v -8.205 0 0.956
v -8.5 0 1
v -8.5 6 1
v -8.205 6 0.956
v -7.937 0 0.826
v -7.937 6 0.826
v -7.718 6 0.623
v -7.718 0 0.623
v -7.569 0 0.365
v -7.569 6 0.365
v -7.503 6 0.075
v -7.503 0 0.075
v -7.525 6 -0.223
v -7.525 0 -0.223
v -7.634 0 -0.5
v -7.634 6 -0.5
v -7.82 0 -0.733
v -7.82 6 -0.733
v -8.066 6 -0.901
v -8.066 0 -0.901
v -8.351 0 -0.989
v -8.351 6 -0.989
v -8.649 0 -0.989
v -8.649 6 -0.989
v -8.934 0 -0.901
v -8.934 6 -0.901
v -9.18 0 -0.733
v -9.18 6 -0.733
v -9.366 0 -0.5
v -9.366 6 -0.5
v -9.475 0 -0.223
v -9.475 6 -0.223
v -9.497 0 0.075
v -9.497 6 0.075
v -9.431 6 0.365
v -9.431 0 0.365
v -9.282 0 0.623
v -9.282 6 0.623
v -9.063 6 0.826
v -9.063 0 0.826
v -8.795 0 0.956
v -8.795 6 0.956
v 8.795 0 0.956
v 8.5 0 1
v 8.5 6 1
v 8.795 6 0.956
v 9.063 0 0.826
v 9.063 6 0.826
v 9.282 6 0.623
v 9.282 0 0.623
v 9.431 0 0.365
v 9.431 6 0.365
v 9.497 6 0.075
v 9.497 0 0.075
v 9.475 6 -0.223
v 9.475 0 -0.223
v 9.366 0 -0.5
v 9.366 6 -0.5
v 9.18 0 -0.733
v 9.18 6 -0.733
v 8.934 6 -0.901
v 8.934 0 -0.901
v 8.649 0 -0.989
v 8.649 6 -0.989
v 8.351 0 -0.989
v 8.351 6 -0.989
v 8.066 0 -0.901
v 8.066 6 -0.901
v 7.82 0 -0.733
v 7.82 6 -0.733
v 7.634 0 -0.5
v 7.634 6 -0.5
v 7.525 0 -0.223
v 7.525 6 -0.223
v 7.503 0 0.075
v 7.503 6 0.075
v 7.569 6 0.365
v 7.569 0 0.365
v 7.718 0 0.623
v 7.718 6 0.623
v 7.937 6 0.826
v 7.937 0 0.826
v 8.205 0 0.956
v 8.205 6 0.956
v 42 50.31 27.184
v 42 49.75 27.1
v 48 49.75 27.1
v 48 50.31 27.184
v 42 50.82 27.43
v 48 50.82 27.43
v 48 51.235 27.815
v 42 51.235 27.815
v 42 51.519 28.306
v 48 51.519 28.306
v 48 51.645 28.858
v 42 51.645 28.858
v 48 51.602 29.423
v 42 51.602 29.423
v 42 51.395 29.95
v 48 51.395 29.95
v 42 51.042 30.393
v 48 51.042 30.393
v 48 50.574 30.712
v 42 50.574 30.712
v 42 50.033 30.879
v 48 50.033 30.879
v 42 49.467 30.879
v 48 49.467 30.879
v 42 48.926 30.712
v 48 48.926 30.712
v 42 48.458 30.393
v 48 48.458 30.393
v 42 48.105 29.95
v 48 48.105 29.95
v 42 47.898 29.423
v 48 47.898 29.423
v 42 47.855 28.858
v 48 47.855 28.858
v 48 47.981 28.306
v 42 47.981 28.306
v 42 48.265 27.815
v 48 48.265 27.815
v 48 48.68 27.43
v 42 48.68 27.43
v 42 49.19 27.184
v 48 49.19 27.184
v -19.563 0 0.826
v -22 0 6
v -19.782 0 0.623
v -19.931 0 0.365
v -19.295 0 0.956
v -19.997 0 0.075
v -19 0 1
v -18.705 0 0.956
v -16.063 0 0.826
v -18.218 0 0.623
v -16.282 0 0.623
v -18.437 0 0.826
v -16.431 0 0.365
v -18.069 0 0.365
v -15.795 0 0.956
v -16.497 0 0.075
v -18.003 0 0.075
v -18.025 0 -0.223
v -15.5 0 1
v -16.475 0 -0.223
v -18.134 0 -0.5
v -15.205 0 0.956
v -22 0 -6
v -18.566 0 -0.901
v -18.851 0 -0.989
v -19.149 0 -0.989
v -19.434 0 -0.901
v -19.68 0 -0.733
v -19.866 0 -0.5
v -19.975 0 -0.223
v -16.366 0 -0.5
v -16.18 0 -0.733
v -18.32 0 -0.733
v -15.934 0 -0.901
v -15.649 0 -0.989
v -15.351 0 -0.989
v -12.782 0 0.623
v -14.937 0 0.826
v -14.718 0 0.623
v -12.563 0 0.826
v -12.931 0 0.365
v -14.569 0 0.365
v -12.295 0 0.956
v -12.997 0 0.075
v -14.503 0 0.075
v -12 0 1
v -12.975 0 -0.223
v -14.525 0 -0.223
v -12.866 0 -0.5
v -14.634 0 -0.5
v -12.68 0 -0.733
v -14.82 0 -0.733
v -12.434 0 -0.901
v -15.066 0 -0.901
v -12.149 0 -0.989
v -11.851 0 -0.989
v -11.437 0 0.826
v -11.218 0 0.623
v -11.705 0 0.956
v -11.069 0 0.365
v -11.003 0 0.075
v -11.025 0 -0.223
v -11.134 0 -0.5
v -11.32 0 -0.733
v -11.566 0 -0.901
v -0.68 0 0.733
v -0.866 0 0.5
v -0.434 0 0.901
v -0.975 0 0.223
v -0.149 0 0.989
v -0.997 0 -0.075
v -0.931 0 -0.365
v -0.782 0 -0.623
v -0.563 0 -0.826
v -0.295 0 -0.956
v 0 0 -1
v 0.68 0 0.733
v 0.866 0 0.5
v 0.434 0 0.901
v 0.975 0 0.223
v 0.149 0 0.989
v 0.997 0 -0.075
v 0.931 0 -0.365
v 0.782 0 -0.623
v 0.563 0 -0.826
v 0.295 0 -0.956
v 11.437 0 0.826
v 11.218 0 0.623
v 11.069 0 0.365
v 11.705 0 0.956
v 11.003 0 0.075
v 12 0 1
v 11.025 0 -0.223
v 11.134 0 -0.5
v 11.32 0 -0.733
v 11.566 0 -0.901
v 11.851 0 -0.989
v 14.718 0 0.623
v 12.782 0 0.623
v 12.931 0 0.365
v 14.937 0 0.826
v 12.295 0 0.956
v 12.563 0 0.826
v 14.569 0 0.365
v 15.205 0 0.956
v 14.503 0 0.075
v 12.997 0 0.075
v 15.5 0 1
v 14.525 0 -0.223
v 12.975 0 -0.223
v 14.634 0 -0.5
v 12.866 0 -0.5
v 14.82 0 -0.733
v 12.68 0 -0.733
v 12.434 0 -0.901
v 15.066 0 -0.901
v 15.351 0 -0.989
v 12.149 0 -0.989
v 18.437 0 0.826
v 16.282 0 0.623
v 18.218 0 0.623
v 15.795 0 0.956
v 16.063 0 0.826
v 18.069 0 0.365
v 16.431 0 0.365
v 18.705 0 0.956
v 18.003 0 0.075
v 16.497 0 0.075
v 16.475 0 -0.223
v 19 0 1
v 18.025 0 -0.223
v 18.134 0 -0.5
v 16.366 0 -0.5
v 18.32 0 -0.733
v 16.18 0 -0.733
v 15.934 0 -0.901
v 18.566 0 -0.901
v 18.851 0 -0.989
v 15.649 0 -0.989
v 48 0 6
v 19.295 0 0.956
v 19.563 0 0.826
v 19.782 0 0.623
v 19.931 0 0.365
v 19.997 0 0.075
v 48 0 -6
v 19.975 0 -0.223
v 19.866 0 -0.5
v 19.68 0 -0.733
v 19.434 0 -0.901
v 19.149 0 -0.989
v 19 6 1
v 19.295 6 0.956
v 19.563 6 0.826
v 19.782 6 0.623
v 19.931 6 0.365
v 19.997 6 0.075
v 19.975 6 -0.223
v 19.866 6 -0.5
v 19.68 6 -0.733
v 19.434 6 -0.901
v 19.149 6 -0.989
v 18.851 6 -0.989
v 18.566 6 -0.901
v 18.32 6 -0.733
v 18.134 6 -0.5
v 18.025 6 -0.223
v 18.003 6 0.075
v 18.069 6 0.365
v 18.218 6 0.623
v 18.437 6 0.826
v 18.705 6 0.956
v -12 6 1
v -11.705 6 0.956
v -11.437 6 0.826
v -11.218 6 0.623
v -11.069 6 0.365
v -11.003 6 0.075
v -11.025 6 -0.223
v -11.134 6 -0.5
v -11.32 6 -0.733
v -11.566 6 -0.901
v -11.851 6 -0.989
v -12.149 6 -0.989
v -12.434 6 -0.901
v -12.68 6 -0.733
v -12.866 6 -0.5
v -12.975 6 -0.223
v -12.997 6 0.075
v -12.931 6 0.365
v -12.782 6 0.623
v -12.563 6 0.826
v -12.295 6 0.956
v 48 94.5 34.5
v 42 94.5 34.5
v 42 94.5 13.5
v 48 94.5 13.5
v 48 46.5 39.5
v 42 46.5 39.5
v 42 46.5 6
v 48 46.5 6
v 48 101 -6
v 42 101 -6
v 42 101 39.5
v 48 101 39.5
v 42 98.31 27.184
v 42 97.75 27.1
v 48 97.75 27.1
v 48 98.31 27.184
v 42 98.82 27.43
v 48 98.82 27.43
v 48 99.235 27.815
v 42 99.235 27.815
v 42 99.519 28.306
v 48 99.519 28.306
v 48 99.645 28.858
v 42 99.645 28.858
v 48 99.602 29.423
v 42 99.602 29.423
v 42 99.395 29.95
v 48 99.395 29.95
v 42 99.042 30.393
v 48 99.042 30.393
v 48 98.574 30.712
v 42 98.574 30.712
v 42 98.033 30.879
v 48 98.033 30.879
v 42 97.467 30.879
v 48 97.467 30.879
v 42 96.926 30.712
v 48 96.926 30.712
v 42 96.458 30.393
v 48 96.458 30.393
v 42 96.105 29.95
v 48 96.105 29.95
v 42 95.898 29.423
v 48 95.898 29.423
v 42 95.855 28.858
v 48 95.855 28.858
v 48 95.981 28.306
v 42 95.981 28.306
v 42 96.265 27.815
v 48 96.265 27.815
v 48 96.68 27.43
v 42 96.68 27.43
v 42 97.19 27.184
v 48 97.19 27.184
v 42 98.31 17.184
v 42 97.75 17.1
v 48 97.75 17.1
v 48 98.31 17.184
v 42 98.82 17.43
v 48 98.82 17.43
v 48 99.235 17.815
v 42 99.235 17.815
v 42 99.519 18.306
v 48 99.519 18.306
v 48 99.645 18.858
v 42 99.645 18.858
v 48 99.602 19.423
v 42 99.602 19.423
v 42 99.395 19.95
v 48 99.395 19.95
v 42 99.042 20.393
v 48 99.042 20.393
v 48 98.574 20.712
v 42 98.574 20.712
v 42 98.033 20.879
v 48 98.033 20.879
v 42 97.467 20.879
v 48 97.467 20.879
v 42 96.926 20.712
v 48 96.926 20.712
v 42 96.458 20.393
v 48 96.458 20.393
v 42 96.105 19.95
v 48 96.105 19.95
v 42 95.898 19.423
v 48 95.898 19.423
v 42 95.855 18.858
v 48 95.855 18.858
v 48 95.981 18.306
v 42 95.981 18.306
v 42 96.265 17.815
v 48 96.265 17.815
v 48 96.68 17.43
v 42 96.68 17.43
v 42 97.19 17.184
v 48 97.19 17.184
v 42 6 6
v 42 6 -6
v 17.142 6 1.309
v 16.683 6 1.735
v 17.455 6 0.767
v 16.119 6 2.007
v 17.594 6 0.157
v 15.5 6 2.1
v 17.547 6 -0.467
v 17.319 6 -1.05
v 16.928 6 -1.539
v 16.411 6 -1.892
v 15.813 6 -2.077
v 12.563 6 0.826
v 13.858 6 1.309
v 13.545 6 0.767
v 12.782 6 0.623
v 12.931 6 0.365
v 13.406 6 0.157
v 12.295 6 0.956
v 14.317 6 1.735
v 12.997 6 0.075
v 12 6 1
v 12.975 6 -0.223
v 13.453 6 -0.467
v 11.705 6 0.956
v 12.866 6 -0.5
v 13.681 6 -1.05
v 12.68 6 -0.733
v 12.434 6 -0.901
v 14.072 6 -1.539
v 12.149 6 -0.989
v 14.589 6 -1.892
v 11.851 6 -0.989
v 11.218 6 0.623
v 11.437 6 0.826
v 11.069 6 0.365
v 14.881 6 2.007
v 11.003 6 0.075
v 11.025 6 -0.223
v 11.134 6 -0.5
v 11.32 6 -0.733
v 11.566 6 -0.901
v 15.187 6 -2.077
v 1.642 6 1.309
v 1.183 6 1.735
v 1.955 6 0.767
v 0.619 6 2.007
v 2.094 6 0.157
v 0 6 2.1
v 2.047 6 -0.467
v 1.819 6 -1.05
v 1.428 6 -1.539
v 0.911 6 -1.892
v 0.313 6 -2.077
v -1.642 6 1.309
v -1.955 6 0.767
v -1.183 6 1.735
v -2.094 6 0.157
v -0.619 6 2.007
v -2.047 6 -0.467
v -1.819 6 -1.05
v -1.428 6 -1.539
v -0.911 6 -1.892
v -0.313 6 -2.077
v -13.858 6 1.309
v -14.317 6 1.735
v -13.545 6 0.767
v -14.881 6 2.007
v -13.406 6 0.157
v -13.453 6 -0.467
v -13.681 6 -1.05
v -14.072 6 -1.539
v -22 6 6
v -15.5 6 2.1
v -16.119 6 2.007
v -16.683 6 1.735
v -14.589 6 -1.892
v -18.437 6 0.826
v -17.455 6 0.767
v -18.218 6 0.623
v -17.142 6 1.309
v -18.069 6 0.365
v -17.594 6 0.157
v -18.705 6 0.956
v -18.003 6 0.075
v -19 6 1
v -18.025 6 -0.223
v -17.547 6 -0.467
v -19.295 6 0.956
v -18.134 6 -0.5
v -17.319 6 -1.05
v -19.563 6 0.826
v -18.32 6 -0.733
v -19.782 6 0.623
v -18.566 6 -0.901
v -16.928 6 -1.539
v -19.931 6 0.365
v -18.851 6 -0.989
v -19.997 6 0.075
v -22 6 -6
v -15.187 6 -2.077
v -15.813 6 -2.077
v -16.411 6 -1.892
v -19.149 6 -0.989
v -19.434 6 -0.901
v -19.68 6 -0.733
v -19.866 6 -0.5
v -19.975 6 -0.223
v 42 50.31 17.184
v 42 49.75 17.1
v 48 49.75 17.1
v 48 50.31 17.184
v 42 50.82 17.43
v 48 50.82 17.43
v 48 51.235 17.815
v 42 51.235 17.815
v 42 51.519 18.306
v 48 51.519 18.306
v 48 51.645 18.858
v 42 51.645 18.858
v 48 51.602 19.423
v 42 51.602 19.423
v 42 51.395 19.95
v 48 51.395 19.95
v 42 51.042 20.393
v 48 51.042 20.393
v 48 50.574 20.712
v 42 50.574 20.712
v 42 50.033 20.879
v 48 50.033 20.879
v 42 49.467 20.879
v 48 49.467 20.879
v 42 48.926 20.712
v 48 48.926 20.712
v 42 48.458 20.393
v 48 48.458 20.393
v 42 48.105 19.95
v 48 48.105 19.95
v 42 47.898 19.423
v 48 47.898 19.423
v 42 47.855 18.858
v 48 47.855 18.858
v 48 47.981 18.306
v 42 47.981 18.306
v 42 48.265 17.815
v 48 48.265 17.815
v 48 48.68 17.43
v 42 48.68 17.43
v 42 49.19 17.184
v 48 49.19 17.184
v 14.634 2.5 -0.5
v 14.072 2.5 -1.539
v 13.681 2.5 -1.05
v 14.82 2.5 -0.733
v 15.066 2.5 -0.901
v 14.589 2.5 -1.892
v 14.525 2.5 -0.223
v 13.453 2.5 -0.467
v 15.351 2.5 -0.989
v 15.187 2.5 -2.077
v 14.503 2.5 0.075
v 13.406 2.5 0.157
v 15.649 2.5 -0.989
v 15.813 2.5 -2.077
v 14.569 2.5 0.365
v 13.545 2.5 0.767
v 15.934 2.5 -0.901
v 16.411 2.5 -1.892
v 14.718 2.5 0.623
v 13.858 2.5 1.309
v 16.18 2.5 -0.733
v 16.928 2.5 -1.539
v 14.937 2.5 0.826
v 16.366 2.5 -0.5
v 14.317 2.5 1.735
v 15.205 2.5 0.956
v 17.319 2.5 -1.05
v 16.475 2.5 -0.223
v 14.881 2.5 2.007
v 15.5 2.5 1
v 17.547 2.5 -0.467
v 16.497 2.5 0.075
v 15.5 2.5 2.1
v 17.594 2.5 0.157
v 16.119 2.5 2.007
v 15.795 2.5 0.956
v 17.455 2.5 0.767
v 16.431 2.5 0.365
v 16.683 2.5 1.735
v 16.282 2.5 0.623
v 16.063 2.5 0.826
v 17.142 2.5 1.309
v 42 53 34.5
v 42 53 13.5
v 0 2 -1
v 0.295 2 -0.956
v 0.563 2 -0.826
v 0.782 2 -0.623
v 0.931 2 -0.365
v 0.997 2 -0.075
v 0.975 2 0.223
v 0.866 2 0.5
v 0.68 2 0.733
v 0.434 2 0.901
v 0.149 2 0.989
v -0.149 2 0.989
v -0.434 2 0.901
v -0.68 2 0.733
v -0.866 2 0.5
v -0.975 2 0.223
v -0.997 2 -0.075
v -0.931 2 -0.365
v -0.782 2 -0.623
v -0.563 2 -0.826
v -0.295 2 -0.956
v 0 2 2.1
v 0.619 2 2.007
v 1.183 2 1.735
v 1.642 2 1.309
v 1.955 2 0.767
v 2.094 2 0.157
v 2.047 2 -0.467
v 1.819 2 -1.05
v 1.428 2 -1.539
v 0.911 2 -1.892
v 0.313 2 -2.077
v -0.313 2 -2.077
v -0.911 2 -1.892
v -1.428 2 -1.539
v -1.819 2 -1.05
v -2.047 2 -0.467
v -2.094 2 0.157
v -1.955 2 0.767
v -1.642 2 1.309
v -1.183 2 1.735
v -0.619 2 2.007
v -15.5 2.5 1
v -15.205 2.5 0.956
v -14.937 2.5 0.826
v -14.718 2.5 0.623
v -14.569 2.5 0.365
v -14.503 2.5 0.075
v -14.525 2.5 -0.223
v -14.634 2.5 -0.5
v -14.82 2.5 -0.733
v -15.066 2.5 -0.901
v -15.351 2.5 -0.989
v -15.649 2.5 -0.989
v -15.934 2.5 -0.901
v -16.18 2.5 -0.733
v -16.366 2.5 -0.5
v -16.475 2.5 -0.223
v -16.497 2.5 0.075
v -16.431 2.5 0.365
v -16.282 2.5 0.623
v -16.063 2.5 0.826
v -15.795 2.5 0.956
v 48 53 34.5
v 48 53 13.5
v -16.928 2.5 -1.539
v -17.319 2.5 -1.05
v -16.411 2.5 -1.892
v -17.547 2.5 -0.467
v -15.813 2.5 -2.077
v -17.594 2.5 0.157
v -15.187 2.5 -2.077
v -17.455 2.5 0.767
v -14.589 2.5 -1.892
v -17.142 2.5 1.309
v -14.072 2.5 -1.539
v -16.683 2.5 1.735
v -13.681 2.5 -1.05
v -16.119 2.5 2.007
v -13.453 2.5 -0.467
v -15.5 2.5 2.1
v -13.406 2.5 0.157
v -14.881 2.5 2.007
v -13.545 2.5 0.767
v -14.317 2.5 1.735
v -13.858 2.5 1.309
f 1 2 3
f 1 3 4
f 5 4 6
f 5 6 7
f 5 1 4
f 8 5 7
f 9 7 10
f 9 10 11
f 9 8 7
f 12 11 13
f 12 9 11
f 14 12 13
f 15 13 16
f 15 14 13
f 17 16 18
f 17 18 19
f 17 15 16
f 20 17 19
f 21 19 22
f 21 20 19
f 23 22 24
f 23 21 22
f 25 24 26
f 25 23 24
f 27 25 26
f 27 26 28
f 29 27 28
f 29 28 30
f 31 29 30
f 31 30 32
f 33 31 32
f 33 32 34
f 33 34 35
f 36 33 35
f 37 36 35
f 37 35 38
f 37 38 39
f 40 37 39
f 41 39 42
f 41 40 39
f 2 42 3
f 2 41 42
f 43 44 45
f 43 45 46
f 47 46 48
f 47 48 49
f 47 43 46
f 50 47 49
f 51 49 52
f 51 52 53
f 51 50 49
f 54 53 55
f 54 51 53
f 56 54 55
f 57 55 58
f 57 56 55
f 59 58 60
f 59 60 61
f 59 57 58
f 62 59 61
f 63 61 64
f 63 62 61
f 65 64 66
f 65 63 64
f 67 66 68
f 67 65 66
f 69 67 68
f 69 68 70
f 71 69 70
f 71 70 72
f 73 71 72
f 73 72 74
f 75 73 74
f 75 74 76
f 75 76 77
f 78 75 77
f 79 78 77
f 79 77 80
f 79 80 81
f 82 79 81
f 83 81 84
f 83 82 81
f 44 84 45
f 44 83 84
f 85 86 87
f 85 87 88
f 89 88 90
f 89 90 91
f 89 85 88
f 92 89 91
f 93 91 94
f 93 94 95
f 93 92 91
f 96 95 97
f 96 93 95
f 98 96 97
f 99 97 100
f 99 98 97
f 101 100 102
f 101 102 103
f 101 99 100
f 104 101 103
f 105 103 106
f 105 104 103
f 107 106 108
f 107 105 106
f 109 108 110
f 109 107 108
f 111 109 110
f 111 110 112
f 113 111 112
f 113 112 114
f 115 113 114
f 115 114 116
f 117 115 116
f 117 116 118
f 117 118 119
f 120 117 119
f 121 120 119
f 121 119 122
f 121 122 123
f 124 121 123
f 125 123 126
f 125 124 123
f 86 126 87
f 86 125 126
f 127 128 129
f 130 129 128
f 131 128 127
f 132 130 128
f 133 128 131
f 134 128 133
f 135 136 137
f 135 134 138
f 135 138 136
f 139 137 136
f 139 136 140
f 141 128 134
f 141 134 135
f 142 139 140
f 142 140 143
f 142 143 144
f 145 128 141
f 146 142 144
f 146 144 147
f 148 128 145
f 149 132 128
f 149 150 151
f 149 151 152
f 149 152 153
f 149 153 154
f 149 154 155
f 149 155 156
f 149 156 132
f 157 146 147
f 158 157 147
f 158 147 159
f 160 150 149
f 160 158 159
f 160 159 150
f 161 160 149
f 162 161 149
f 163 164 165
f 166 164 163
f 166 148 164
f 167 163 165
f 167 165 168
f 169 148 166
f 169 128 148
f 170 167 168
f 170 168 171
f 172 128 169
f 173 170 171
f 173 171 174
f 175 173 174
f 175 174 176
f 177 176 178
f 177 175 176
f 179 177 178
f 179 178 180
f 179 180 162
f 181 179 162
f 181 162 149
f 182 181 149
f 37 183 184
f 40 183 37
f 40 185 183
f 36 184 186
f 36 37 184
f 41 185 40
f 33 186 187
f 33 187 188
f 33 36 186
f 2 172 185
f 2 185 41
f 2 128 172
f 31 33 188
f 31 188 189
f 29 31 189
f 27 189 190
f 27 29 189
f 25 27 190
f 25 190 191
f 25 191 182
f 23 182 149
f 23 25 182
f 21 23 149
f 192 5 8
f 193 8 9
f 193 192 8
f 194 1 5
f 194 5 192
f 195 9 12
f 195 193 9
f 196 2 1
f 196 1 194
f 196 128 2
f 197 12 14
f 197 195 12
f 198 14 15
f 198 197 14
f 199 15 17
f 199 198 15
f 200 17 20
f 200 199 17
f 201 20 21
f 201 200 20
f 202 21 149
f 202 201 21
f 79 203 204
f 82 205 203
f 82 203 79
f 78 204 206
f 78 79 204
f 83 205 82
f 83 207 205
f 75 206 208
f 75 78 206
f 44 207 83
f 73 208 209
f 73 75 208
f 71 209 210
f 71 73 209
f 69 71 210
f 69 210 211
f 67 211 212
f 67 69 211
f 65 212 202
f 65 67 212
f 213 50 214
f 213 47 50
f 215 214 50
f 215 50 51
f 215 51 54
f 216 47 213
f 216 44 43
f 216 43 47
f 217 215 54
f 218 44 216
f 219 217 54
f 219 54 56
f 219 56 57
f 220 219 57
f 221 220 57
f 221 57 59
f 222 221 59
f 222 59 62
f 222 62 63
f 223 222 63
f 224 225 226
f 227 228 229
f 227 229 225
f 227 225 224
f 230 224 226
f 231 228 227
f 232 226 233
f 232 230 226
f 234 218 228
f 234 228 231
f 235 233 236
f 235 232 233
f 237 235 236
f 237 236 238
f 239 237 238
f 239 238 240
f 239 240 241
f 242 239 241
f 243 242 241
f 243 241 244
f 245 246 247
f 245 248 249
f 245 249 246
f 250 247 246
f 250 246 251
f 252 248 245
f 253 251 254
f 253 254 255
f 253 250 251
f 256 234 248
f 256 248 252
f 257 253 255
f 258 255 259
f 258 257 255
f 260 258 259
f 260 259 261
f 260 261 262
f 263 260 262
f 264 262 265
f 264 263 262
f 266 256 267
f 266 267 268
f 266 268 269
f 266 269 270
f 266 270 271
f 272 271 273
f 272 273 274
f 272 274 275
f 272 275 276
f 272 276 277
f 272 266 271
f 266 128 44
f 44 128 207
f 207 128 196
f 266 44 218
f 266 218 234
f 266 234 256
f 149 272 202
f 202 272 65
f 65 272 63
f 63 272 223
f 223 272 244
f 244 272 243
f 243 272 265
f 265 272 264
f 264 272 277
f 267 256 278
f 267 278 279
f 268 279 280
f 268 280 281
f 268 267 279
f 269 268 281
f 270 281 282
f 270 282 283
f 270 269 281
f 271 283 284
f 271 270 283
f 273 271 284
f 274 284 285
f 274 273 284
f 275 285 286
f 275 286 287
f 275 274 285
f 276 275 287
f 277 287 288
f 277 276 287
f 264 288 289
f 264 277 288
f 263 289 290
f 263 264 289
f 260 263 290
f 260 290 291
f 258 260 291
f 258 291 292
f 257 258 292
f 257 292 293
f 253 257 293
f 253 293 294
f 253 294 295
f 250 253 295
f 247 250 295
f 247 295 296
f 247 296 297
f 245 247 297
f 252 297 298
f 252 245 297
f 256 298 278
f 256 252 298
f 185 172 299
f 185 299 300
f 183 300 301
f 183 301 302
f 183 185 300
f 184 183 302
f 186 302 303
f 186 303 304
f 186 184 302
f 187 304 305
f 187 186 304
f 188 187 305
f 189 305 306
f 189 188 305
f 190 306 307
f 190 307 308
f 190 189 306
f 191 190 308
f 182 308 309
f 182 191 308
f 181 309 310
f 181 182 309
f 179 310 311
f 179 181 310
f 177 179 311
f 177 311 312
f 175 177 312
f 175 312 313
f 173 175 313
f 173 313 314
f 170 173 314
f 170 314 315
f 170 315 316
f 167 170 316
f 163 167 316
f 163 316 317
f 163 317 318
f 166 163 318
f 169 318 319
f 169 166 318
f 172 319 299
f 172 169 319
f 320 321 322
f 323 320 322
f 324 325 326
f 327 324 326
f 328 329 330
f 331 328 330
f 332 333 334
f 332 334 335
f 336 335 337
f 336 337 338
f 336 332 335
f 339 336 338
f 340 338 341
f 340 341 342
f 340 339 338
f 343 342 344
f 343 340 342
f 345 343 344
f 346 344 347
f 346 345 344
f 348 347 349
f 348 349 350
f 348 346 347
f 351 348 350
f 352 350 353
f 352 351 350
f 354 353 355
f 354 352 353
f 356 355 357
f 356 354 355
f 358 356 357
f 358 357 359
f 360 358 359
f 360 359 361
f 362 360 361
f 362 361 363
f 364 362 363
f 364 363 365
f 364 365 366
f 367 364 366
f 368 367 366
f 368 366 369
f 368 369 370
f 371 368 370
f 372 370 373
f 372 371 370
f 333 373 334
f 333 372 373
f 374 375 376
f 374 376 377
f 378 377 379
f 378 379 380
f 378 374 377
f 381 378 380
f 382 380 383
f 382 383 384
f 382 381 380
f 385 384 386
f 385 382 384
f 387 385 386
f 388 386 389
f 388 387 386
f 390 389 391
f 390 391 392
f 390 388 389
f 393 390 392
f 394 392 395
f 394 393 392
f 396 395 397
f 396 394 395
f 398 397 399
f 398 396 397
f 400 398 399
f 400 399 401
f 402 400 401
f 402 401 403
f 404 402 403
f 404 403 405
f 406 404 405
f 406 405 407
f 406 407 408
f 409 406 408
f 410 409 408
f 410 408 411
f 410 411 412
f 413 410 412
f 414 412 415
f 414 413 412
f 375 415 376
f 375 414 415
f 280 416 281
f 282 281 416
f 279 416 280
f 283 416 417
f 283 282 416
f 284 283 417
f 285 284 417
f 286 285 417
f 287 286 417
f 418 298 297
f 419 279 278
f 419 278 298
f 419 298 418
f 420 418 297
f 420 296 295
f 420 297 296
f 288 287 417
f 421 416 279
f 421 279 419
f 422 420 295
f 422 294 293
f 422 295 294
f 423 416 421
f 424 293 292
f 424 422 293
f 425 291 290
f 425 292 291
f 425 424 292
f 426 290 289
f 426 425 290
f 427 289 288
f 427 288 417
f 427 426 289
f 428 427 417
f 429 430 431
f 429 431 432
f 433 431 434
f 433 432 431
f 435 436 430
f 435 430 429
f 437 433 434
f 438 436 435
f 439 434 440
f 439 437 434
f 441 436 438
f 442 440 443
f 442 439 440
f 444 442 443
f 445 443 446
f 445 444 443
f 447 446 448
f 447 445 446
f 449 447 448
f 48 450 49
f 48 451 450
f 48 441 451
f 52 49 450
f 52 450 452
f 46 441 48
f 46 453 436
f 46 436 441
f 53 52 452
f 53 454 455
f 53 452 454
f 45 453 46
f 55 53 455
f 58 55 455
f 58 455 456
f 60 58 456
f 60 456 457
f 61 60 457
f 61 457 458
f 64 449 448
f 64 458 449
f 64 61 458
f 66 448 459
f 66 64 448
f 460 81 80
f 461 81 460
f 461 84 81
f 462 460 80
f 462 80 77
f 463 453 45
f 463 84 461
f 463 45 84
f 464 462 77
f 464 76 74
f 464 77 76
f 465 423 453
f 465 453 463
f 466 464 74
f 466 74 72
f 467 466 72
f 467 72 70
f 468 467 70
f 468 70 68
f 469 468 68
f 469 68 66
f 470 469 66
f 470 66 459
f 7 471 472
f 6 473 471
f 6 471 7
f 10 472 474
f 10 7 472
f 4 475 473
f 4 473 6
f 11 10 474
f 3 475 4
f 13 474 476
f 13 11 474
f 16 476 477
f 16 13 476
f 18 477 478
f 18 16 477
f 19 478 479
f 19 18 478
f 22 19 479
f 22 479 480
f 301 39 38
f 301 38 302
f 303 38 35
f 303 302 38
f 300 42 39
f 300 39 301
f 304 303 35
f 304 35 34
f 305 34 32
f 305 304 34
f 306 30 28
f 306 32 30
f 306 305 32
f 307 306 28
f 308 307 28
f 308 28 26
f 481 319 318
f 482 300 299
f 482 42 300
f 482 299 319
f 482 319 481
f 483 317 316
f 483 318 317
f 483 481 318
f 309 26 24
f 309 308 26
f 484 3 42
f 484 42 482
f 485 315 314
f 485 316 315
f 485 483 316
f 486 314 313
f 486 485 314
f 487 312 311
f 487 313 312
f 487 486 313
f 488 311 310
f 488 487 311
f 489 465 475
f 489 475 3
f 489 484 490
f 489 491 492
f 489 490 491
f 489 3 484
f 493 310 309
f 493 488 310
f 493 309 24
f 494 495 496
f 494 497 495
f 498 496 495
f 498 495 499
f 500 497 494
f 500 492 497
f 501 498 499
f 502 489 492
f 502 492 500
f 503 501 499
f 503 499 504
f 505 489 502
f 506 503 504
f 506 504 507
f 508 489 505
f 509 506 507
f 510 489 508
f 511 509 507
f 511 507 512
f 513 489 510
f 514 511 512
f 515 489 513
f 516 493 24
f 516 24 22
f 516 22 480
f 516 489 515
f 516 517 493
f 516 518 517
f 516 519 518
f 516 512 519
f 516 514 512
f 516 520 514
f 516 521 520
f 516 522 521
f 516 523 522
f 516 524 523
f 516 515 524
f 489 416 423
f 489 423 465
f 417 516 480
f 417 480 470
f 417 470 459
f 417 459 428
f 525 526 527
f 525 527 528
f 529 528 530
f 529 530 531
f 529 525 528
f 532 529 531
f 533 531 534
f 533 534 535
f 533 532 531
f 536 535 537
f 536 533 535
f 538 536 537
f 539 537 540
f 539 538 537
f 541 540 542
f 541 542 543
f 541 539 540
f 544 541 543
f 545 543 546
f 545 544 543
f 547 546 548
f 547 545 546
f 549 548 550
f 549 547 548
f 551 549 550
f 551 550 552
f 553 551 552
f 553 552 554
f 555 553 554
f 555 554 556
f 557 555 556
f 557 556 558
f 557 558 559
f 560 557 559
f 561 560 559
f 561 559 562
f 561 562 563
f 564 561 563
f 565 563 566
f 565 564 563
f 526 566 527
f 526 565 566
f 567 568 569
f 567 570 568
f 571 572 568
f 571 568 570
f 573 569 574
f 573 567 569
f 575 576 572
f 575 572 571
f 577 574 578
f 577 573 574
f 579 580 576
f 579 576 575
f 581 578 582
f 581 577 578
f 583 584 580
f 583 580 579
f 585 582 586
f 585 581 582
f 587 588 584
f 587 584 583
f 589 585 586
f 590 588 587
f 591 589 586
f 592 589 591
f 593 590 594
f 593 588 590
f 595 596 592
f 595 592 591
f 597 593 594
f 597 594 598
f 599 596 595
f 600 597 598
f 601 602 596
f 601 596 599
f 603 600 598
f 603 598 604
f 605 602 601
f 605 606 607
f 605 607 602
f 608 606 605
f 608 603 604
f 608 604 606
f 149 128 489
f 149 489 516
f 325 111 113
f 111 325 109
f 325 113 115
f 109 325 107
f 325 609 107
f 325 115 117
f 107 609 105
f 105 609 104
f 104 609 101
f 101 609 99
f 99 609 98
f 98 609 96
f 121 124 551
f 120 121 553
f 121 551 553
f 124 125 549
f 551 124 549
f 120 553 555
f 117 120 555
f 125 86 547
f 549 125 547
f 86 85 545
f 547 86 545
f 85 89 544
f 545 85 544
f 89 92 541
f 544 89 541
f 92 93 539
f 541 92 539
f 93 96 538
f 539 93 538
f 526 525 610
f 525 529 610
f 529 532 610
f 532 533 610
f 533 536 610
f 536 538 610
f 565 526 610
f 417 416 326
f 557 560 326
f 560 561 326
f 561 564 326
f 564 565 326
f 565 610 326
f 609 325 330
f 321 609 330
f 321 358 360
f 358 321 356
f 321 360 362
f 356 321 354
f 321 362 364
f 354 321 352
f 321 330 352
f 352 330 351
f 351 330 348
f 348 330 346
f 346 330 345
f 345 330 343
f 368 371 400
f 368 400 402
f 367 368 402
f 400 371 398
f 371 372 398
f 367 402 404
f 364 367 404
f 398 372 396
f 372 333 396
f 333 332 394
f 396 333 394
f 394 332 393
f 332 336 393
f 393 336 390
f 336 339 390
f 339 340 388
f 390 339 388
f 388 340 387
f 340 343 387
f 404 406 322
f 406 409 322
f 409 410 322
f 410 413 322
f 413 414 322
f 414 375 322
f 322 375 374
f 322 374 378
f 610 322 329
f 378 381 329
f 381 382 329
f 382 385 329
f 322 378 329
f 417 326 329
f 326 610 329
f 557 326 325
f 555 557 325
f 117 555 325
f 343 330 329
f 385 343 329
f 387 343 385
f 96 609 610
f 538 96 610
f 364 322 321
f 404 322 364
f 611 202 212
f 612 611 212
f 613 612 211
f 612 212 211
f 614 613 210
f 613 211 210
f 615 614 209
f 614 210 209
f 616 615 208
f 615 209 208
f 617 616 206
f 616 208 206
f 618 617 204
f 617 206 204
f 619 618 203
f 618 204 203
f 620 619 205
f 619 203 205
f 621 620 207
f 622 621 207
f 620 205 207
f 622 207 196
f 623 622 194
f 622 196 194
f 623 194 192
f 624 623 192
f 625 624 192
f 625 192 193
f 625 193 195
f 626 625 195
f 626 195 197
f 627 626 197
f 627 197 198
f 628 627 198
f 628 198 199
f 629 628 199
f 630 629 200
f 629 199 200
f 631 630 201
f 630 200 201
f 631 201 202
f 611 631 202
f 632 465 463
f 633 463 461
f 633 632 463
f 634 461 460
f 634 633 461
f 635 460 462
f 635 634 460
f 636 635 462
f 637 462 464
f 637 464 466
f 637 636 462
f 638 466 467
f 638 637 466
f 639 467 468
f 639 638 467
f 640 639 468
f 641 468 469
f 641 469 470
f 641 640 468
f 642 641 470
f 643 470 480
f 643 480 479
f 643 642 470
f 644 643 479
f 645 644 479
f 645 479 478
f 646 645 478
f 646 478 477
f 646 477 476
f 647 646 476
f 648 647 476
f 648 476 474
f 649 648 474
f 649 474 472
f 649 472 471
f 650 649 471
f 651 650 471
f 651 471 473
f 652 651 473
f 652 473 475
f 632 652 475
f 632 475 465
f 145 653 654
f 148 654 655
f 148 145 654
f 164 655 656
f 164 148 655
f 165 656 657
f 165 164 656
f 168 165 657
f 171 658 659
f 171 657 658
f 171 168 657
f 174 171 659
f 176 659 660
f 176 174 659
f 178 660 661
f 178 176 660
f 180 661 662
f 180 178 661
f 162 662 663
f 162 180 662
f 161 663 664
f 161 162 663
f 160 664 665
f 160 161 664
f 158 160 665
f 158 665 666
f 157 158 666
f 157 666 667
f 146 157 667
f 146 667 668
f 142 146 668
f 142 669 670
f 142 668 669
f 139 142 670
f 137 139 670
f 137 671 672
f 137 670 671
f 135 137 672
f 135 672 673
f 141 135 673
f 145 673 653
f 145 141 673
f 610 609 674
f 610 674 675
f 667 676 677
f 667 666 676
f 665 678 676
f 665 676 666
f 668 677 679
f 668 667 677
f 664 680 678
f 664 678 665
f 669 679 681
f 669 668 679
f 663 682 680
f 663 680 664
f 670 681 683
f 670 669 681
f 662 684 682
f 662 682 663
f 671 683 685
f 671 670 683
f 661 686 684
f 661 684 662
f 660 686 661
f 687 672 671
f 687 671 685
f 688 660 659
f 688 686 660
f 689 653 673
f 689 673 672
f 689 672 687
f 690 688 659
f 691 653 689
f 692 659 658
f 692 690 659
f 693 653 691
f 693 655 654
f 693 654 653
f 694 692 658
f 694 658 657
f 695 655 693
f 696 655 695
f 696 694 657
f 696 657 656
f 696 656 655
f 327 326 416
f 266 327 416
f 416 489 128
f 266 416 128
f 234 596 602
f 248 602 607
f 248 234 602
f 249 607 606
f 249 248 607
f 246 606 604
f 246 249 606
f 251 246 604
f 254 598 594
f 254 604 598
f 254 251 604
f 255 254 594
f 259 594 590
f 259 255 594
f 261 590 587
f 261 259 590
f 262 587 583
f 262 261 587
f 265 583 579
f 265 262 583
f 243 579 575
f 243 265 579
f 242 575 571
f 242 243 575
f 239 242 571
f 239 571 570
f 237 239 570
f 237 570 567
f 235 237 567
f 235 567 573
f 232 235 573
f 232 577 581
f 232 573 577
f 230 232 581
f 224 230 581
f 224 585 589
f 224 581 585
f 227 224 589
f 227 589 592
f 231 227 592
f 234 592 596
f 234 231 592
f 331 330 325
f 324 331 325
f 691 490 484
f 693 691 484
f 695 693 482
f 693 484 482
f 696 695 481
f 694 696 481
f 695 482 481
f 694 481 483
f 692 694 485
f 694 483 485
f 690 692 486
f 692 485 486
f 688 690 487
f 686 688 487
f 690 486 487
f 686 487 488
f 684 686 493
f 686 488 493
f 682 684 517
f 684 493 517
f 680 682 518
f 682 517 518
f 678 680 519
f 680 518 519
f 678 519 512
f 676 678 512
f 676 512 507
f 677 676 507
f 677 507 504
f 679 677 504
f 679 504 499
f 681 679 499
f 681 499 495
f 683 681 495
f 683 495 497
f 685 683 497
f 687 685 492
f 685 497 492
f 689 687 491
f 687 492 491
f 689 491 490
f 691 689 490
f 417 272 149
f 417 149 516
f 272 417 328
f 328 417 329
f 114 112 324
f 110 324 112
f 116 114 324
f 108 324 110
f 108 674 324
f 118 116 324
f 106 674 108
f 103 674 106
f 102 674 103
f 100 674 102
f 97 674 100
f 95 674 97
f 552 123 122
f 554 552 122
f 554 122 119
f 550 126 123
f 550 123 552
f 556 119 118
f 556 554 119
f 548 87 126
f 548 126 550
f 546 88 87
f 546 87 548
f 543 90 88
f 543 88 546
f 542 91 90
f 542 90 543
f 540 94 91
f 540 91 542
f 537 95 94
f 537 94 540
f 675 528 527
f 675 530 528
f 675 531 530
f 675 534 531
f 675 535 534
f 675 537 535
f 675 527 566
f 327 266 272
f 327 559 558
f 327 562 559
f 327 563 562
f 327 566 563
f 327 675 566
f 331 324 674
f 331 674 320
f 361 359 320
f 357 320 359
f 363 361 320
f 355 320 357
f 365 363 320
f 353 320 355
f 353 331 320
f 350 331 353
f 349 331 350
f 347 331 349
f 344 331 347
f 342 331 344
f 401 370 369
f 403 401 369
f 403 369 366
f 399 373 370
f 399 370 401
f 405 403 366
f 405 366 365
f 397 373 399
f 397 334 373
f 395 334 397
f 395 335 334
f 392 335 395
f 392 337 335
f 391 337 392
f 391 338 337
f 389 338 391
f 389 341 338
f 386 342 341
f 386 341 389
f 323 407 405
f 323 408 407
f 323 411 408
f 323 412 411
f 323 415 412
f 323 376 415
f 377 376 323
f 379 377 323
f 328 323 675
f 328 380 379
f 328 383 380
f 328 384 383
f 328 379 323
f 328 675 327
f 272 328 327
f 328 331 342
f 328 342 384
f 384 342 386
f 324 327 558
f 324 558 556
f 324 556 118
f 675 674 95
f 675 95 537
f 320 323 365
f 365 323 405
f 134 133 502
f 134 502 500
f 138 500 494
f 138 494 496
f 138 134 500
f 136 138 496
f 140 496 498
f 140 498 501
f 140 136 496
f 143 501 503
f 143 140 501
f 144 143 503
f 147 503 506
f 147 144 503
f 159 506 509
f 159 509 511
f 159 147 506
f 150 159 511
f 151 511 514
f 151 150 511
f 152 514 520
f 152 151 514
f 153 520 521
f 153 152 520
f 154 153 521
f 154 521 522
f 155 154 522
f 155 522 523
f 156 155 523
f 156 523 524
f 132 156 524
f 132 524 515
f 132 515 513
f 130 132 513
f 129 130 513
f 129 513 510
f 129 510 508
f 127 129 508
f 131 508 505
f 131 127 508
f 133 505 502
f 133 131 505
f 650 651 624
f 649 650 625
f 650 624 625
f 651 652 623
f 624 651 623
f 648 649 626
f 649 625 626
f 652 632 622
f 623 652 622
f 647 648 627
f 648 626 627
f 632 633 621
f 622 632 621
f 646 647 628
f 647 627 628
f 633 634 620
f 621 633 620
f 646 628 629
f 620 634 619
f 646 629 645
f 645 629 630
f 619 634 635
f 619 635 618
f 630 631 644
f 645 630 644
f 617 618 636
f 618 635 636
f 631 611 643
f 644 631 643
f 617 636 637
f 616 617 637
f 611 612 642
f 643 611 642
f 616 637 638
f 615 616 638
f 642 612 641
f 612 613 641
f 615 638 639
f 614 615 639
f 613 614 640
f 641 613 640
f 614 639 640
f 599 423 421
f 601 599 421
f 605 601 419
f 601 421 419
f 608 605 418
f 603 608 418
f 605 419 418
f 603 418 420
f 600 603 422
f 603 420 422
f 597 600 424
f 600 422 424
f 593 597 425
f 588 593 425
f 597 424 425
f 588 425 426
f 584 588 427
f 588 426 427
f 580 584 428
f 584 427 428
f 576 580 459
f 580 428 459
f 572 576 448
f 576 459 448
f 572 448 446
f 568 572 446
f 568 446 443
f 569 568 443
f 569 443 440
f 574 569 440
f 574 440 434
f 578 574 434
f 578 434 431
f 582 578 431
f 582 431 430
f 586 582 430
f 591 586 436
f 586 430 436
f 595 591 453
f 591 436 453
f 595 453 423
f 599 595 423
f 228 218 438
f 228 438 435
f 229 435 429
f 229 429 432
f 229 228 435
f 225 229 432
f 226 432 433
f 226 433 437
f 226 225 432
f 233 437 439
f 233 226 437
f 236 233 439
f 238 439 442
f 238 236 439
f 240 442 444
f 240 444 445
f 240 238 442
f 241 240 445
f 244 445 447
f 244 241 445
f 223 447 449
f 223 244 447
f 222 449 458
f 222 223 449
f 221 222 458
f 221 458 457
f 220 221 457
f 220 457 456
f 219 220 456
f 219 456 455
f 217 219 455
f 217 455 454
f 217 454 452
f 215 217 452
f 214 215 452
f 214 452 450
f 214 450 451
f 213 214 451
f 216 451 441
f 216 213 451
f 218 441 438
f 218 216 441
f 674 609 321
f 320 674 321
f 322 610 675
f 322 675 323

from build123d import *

# Parameters (mm, degrees)
CROQUIS1_W              = 44
CROQUIS1_H              = 12
CROQUIS1_R              = 1
CROQUIS1_R_2            = 2.1
SALIENTE_EXTRUIR1_DEPTH = 6
CROQUIS2_W              = 12
CROQUIS2_H              = 6
SALIENTE_EXTRUIR2_DEPTH = 20
CROQUIS3_R              = 1.9
CROQUIS3_W              = 21
CROQUIS3_H              = 41.5
SALIENTE_EXTRUIR3_DEPTH = 6
CROQUIS4_R              = 2.1
CROQUIS4_R_2            = 1
SALIENTE_EXTRUIR4_DEPTH = 2
CROQUIS5_R              = 2.1
CORTAR_EXTRUIR1_DEPTH   = 3.5


with BuildPart() as part:
    # Croquis1 → Saliente-Extruir1 (new body)
    with BuildSketch(Plane(origin=(0, 0, 0), x_dir=(1, 0, 0), z_dir=(0, 1, 0))):
        Rectangle(CROQUIS1_W, CROQUIS1_H)
        with Locations(Location((15.5, 0, 0), (0, 0, 270))):
            Circle(CROQUIS1_R, mode=Mode.SUBTRACT)
        with Locations(Location((0, 0, 0), (0, 0, 270))):
            Circle(CROQUIS1_R_2, mode=Mode.SUBTRACT)
        with Locations(Location((8.5, 0, 0), (0, 0, 270))):
            Circle(CROQUIS1_R, mode=Mode.SUBTRACT)
        with Locations(Location((-8.5, 0, 0), (0, 0, 270))):
            Circle(CROQUIS1_R, mode=Mode.SUBTRACT)
        with Locations(Location((-12, 0, 0), (0, 0, 270))):
            Circle(CROQUIS1_R, mode=Mode.SUBTRACT)
        with Locations(Location((-15.5, 0, 0), (0, 0, 270))):
            Circle(CROQUIS1_R, mode=Mode.SUBTRACT)
        with Locations(Location((-19, 0, 0), (0, 0, 270))):
            Circle(CROQUIS1_R, mode=Mode.SUBTRACT)
        with Locations(Location((12, 0, 0), (0, 0, 270))):
            Circle(CROQUIS1_R, mode=Mode.SUBTRACT)
        with Locations(Location((19, 0, 0), (0, 0, 270))):
            Circle(CROQUIS1_R, mode=Mode.SUBTRACT)
    extrude(amount=SALIENTE_EXTRUIR1_DEPTH)

    # Croquis2 → Saliente-Extruir2 (add)
    with BuildSketch(Plane(origin=(22, 0, 0), x_dir=(0, 0, -1), z_dir=(1, 0, 0))):
        with Locations((0, 3)):
            Rectangle(CROQUIS2_W, CROQUIS2_H)
    extrude(amount=SALIENTE_EXTRUIR2_DEPTH)

    # Croquis3 → Saliente-Extruir3 (add)
    with BuildSketch(Plane(origin=(42, 0, 0), x_dir=(0, 0, -1), z_dir=(1, 0, 0))):
        Polygon((-6, 46.5), (-6, 0), (6, 0), (6, 101), (-39.5, 101), (-39.5, 46.5), align=None)
        with Locations((-19, 97.75)):
            Circle(CROQUIS3_R, mode=Mode.SUBTRACT)
        with Locations((-29, 49.75)):
            Circle(CROQUIS3_R, mode=Mode.SUBTRACT)
        with Locations((-19, 49.75)):
            Circle(CROQUIS3_R, mode=Mode.SUBTRACT)
        with Locations((-29, 97.75)):
            Circle(CROQUIS3_R, mode=Mode.SUBTRACT)
        with Locations((-24, 73.75)):
            Rectangle(CROQUIS3_W, CROQUIS3_H, mode=Mode.SUBTRACT)
    extrude(amount=SALIENTE_EXTRUIR3_DEPTH)

    # Croquis4 → Saliente-Extruir4 (add)
    with BuildSketch(Plane.XZ):
        with Locations(Location((0, 0, 0), (0, 0, 270))):
            Circle(CROQUIS4_R)
        with Locations(Location((0, 0, 0), (0, 0, 270))):
            Circle(CROQUIS4_R_2, mode=Mode.SUBTRACT)
    extrude(amount=-SALIENTE_EXTRUIR4_DEPTH)

    # Croquis5 → Cortar-Extruir1 (cut)
    with BuildSketch(Plane(origin=(0, 6, 0), x_dir=(1, 0, 0), z_dir=(0, 1, 0))):
        with Locations(Location((-15.5, 0, 0), (0, 0, 270))):
            Circle(CROQUIS5_R)
        with Locations(Location((15.5, 0, 0), (0, 0, 270))):
            Circle(CROQUIS5_R)
    extrude(amount=-CORTAR_EXTRUIR1_DEPTH, mode=Mode.SUBTRACT)


solid = part.part
